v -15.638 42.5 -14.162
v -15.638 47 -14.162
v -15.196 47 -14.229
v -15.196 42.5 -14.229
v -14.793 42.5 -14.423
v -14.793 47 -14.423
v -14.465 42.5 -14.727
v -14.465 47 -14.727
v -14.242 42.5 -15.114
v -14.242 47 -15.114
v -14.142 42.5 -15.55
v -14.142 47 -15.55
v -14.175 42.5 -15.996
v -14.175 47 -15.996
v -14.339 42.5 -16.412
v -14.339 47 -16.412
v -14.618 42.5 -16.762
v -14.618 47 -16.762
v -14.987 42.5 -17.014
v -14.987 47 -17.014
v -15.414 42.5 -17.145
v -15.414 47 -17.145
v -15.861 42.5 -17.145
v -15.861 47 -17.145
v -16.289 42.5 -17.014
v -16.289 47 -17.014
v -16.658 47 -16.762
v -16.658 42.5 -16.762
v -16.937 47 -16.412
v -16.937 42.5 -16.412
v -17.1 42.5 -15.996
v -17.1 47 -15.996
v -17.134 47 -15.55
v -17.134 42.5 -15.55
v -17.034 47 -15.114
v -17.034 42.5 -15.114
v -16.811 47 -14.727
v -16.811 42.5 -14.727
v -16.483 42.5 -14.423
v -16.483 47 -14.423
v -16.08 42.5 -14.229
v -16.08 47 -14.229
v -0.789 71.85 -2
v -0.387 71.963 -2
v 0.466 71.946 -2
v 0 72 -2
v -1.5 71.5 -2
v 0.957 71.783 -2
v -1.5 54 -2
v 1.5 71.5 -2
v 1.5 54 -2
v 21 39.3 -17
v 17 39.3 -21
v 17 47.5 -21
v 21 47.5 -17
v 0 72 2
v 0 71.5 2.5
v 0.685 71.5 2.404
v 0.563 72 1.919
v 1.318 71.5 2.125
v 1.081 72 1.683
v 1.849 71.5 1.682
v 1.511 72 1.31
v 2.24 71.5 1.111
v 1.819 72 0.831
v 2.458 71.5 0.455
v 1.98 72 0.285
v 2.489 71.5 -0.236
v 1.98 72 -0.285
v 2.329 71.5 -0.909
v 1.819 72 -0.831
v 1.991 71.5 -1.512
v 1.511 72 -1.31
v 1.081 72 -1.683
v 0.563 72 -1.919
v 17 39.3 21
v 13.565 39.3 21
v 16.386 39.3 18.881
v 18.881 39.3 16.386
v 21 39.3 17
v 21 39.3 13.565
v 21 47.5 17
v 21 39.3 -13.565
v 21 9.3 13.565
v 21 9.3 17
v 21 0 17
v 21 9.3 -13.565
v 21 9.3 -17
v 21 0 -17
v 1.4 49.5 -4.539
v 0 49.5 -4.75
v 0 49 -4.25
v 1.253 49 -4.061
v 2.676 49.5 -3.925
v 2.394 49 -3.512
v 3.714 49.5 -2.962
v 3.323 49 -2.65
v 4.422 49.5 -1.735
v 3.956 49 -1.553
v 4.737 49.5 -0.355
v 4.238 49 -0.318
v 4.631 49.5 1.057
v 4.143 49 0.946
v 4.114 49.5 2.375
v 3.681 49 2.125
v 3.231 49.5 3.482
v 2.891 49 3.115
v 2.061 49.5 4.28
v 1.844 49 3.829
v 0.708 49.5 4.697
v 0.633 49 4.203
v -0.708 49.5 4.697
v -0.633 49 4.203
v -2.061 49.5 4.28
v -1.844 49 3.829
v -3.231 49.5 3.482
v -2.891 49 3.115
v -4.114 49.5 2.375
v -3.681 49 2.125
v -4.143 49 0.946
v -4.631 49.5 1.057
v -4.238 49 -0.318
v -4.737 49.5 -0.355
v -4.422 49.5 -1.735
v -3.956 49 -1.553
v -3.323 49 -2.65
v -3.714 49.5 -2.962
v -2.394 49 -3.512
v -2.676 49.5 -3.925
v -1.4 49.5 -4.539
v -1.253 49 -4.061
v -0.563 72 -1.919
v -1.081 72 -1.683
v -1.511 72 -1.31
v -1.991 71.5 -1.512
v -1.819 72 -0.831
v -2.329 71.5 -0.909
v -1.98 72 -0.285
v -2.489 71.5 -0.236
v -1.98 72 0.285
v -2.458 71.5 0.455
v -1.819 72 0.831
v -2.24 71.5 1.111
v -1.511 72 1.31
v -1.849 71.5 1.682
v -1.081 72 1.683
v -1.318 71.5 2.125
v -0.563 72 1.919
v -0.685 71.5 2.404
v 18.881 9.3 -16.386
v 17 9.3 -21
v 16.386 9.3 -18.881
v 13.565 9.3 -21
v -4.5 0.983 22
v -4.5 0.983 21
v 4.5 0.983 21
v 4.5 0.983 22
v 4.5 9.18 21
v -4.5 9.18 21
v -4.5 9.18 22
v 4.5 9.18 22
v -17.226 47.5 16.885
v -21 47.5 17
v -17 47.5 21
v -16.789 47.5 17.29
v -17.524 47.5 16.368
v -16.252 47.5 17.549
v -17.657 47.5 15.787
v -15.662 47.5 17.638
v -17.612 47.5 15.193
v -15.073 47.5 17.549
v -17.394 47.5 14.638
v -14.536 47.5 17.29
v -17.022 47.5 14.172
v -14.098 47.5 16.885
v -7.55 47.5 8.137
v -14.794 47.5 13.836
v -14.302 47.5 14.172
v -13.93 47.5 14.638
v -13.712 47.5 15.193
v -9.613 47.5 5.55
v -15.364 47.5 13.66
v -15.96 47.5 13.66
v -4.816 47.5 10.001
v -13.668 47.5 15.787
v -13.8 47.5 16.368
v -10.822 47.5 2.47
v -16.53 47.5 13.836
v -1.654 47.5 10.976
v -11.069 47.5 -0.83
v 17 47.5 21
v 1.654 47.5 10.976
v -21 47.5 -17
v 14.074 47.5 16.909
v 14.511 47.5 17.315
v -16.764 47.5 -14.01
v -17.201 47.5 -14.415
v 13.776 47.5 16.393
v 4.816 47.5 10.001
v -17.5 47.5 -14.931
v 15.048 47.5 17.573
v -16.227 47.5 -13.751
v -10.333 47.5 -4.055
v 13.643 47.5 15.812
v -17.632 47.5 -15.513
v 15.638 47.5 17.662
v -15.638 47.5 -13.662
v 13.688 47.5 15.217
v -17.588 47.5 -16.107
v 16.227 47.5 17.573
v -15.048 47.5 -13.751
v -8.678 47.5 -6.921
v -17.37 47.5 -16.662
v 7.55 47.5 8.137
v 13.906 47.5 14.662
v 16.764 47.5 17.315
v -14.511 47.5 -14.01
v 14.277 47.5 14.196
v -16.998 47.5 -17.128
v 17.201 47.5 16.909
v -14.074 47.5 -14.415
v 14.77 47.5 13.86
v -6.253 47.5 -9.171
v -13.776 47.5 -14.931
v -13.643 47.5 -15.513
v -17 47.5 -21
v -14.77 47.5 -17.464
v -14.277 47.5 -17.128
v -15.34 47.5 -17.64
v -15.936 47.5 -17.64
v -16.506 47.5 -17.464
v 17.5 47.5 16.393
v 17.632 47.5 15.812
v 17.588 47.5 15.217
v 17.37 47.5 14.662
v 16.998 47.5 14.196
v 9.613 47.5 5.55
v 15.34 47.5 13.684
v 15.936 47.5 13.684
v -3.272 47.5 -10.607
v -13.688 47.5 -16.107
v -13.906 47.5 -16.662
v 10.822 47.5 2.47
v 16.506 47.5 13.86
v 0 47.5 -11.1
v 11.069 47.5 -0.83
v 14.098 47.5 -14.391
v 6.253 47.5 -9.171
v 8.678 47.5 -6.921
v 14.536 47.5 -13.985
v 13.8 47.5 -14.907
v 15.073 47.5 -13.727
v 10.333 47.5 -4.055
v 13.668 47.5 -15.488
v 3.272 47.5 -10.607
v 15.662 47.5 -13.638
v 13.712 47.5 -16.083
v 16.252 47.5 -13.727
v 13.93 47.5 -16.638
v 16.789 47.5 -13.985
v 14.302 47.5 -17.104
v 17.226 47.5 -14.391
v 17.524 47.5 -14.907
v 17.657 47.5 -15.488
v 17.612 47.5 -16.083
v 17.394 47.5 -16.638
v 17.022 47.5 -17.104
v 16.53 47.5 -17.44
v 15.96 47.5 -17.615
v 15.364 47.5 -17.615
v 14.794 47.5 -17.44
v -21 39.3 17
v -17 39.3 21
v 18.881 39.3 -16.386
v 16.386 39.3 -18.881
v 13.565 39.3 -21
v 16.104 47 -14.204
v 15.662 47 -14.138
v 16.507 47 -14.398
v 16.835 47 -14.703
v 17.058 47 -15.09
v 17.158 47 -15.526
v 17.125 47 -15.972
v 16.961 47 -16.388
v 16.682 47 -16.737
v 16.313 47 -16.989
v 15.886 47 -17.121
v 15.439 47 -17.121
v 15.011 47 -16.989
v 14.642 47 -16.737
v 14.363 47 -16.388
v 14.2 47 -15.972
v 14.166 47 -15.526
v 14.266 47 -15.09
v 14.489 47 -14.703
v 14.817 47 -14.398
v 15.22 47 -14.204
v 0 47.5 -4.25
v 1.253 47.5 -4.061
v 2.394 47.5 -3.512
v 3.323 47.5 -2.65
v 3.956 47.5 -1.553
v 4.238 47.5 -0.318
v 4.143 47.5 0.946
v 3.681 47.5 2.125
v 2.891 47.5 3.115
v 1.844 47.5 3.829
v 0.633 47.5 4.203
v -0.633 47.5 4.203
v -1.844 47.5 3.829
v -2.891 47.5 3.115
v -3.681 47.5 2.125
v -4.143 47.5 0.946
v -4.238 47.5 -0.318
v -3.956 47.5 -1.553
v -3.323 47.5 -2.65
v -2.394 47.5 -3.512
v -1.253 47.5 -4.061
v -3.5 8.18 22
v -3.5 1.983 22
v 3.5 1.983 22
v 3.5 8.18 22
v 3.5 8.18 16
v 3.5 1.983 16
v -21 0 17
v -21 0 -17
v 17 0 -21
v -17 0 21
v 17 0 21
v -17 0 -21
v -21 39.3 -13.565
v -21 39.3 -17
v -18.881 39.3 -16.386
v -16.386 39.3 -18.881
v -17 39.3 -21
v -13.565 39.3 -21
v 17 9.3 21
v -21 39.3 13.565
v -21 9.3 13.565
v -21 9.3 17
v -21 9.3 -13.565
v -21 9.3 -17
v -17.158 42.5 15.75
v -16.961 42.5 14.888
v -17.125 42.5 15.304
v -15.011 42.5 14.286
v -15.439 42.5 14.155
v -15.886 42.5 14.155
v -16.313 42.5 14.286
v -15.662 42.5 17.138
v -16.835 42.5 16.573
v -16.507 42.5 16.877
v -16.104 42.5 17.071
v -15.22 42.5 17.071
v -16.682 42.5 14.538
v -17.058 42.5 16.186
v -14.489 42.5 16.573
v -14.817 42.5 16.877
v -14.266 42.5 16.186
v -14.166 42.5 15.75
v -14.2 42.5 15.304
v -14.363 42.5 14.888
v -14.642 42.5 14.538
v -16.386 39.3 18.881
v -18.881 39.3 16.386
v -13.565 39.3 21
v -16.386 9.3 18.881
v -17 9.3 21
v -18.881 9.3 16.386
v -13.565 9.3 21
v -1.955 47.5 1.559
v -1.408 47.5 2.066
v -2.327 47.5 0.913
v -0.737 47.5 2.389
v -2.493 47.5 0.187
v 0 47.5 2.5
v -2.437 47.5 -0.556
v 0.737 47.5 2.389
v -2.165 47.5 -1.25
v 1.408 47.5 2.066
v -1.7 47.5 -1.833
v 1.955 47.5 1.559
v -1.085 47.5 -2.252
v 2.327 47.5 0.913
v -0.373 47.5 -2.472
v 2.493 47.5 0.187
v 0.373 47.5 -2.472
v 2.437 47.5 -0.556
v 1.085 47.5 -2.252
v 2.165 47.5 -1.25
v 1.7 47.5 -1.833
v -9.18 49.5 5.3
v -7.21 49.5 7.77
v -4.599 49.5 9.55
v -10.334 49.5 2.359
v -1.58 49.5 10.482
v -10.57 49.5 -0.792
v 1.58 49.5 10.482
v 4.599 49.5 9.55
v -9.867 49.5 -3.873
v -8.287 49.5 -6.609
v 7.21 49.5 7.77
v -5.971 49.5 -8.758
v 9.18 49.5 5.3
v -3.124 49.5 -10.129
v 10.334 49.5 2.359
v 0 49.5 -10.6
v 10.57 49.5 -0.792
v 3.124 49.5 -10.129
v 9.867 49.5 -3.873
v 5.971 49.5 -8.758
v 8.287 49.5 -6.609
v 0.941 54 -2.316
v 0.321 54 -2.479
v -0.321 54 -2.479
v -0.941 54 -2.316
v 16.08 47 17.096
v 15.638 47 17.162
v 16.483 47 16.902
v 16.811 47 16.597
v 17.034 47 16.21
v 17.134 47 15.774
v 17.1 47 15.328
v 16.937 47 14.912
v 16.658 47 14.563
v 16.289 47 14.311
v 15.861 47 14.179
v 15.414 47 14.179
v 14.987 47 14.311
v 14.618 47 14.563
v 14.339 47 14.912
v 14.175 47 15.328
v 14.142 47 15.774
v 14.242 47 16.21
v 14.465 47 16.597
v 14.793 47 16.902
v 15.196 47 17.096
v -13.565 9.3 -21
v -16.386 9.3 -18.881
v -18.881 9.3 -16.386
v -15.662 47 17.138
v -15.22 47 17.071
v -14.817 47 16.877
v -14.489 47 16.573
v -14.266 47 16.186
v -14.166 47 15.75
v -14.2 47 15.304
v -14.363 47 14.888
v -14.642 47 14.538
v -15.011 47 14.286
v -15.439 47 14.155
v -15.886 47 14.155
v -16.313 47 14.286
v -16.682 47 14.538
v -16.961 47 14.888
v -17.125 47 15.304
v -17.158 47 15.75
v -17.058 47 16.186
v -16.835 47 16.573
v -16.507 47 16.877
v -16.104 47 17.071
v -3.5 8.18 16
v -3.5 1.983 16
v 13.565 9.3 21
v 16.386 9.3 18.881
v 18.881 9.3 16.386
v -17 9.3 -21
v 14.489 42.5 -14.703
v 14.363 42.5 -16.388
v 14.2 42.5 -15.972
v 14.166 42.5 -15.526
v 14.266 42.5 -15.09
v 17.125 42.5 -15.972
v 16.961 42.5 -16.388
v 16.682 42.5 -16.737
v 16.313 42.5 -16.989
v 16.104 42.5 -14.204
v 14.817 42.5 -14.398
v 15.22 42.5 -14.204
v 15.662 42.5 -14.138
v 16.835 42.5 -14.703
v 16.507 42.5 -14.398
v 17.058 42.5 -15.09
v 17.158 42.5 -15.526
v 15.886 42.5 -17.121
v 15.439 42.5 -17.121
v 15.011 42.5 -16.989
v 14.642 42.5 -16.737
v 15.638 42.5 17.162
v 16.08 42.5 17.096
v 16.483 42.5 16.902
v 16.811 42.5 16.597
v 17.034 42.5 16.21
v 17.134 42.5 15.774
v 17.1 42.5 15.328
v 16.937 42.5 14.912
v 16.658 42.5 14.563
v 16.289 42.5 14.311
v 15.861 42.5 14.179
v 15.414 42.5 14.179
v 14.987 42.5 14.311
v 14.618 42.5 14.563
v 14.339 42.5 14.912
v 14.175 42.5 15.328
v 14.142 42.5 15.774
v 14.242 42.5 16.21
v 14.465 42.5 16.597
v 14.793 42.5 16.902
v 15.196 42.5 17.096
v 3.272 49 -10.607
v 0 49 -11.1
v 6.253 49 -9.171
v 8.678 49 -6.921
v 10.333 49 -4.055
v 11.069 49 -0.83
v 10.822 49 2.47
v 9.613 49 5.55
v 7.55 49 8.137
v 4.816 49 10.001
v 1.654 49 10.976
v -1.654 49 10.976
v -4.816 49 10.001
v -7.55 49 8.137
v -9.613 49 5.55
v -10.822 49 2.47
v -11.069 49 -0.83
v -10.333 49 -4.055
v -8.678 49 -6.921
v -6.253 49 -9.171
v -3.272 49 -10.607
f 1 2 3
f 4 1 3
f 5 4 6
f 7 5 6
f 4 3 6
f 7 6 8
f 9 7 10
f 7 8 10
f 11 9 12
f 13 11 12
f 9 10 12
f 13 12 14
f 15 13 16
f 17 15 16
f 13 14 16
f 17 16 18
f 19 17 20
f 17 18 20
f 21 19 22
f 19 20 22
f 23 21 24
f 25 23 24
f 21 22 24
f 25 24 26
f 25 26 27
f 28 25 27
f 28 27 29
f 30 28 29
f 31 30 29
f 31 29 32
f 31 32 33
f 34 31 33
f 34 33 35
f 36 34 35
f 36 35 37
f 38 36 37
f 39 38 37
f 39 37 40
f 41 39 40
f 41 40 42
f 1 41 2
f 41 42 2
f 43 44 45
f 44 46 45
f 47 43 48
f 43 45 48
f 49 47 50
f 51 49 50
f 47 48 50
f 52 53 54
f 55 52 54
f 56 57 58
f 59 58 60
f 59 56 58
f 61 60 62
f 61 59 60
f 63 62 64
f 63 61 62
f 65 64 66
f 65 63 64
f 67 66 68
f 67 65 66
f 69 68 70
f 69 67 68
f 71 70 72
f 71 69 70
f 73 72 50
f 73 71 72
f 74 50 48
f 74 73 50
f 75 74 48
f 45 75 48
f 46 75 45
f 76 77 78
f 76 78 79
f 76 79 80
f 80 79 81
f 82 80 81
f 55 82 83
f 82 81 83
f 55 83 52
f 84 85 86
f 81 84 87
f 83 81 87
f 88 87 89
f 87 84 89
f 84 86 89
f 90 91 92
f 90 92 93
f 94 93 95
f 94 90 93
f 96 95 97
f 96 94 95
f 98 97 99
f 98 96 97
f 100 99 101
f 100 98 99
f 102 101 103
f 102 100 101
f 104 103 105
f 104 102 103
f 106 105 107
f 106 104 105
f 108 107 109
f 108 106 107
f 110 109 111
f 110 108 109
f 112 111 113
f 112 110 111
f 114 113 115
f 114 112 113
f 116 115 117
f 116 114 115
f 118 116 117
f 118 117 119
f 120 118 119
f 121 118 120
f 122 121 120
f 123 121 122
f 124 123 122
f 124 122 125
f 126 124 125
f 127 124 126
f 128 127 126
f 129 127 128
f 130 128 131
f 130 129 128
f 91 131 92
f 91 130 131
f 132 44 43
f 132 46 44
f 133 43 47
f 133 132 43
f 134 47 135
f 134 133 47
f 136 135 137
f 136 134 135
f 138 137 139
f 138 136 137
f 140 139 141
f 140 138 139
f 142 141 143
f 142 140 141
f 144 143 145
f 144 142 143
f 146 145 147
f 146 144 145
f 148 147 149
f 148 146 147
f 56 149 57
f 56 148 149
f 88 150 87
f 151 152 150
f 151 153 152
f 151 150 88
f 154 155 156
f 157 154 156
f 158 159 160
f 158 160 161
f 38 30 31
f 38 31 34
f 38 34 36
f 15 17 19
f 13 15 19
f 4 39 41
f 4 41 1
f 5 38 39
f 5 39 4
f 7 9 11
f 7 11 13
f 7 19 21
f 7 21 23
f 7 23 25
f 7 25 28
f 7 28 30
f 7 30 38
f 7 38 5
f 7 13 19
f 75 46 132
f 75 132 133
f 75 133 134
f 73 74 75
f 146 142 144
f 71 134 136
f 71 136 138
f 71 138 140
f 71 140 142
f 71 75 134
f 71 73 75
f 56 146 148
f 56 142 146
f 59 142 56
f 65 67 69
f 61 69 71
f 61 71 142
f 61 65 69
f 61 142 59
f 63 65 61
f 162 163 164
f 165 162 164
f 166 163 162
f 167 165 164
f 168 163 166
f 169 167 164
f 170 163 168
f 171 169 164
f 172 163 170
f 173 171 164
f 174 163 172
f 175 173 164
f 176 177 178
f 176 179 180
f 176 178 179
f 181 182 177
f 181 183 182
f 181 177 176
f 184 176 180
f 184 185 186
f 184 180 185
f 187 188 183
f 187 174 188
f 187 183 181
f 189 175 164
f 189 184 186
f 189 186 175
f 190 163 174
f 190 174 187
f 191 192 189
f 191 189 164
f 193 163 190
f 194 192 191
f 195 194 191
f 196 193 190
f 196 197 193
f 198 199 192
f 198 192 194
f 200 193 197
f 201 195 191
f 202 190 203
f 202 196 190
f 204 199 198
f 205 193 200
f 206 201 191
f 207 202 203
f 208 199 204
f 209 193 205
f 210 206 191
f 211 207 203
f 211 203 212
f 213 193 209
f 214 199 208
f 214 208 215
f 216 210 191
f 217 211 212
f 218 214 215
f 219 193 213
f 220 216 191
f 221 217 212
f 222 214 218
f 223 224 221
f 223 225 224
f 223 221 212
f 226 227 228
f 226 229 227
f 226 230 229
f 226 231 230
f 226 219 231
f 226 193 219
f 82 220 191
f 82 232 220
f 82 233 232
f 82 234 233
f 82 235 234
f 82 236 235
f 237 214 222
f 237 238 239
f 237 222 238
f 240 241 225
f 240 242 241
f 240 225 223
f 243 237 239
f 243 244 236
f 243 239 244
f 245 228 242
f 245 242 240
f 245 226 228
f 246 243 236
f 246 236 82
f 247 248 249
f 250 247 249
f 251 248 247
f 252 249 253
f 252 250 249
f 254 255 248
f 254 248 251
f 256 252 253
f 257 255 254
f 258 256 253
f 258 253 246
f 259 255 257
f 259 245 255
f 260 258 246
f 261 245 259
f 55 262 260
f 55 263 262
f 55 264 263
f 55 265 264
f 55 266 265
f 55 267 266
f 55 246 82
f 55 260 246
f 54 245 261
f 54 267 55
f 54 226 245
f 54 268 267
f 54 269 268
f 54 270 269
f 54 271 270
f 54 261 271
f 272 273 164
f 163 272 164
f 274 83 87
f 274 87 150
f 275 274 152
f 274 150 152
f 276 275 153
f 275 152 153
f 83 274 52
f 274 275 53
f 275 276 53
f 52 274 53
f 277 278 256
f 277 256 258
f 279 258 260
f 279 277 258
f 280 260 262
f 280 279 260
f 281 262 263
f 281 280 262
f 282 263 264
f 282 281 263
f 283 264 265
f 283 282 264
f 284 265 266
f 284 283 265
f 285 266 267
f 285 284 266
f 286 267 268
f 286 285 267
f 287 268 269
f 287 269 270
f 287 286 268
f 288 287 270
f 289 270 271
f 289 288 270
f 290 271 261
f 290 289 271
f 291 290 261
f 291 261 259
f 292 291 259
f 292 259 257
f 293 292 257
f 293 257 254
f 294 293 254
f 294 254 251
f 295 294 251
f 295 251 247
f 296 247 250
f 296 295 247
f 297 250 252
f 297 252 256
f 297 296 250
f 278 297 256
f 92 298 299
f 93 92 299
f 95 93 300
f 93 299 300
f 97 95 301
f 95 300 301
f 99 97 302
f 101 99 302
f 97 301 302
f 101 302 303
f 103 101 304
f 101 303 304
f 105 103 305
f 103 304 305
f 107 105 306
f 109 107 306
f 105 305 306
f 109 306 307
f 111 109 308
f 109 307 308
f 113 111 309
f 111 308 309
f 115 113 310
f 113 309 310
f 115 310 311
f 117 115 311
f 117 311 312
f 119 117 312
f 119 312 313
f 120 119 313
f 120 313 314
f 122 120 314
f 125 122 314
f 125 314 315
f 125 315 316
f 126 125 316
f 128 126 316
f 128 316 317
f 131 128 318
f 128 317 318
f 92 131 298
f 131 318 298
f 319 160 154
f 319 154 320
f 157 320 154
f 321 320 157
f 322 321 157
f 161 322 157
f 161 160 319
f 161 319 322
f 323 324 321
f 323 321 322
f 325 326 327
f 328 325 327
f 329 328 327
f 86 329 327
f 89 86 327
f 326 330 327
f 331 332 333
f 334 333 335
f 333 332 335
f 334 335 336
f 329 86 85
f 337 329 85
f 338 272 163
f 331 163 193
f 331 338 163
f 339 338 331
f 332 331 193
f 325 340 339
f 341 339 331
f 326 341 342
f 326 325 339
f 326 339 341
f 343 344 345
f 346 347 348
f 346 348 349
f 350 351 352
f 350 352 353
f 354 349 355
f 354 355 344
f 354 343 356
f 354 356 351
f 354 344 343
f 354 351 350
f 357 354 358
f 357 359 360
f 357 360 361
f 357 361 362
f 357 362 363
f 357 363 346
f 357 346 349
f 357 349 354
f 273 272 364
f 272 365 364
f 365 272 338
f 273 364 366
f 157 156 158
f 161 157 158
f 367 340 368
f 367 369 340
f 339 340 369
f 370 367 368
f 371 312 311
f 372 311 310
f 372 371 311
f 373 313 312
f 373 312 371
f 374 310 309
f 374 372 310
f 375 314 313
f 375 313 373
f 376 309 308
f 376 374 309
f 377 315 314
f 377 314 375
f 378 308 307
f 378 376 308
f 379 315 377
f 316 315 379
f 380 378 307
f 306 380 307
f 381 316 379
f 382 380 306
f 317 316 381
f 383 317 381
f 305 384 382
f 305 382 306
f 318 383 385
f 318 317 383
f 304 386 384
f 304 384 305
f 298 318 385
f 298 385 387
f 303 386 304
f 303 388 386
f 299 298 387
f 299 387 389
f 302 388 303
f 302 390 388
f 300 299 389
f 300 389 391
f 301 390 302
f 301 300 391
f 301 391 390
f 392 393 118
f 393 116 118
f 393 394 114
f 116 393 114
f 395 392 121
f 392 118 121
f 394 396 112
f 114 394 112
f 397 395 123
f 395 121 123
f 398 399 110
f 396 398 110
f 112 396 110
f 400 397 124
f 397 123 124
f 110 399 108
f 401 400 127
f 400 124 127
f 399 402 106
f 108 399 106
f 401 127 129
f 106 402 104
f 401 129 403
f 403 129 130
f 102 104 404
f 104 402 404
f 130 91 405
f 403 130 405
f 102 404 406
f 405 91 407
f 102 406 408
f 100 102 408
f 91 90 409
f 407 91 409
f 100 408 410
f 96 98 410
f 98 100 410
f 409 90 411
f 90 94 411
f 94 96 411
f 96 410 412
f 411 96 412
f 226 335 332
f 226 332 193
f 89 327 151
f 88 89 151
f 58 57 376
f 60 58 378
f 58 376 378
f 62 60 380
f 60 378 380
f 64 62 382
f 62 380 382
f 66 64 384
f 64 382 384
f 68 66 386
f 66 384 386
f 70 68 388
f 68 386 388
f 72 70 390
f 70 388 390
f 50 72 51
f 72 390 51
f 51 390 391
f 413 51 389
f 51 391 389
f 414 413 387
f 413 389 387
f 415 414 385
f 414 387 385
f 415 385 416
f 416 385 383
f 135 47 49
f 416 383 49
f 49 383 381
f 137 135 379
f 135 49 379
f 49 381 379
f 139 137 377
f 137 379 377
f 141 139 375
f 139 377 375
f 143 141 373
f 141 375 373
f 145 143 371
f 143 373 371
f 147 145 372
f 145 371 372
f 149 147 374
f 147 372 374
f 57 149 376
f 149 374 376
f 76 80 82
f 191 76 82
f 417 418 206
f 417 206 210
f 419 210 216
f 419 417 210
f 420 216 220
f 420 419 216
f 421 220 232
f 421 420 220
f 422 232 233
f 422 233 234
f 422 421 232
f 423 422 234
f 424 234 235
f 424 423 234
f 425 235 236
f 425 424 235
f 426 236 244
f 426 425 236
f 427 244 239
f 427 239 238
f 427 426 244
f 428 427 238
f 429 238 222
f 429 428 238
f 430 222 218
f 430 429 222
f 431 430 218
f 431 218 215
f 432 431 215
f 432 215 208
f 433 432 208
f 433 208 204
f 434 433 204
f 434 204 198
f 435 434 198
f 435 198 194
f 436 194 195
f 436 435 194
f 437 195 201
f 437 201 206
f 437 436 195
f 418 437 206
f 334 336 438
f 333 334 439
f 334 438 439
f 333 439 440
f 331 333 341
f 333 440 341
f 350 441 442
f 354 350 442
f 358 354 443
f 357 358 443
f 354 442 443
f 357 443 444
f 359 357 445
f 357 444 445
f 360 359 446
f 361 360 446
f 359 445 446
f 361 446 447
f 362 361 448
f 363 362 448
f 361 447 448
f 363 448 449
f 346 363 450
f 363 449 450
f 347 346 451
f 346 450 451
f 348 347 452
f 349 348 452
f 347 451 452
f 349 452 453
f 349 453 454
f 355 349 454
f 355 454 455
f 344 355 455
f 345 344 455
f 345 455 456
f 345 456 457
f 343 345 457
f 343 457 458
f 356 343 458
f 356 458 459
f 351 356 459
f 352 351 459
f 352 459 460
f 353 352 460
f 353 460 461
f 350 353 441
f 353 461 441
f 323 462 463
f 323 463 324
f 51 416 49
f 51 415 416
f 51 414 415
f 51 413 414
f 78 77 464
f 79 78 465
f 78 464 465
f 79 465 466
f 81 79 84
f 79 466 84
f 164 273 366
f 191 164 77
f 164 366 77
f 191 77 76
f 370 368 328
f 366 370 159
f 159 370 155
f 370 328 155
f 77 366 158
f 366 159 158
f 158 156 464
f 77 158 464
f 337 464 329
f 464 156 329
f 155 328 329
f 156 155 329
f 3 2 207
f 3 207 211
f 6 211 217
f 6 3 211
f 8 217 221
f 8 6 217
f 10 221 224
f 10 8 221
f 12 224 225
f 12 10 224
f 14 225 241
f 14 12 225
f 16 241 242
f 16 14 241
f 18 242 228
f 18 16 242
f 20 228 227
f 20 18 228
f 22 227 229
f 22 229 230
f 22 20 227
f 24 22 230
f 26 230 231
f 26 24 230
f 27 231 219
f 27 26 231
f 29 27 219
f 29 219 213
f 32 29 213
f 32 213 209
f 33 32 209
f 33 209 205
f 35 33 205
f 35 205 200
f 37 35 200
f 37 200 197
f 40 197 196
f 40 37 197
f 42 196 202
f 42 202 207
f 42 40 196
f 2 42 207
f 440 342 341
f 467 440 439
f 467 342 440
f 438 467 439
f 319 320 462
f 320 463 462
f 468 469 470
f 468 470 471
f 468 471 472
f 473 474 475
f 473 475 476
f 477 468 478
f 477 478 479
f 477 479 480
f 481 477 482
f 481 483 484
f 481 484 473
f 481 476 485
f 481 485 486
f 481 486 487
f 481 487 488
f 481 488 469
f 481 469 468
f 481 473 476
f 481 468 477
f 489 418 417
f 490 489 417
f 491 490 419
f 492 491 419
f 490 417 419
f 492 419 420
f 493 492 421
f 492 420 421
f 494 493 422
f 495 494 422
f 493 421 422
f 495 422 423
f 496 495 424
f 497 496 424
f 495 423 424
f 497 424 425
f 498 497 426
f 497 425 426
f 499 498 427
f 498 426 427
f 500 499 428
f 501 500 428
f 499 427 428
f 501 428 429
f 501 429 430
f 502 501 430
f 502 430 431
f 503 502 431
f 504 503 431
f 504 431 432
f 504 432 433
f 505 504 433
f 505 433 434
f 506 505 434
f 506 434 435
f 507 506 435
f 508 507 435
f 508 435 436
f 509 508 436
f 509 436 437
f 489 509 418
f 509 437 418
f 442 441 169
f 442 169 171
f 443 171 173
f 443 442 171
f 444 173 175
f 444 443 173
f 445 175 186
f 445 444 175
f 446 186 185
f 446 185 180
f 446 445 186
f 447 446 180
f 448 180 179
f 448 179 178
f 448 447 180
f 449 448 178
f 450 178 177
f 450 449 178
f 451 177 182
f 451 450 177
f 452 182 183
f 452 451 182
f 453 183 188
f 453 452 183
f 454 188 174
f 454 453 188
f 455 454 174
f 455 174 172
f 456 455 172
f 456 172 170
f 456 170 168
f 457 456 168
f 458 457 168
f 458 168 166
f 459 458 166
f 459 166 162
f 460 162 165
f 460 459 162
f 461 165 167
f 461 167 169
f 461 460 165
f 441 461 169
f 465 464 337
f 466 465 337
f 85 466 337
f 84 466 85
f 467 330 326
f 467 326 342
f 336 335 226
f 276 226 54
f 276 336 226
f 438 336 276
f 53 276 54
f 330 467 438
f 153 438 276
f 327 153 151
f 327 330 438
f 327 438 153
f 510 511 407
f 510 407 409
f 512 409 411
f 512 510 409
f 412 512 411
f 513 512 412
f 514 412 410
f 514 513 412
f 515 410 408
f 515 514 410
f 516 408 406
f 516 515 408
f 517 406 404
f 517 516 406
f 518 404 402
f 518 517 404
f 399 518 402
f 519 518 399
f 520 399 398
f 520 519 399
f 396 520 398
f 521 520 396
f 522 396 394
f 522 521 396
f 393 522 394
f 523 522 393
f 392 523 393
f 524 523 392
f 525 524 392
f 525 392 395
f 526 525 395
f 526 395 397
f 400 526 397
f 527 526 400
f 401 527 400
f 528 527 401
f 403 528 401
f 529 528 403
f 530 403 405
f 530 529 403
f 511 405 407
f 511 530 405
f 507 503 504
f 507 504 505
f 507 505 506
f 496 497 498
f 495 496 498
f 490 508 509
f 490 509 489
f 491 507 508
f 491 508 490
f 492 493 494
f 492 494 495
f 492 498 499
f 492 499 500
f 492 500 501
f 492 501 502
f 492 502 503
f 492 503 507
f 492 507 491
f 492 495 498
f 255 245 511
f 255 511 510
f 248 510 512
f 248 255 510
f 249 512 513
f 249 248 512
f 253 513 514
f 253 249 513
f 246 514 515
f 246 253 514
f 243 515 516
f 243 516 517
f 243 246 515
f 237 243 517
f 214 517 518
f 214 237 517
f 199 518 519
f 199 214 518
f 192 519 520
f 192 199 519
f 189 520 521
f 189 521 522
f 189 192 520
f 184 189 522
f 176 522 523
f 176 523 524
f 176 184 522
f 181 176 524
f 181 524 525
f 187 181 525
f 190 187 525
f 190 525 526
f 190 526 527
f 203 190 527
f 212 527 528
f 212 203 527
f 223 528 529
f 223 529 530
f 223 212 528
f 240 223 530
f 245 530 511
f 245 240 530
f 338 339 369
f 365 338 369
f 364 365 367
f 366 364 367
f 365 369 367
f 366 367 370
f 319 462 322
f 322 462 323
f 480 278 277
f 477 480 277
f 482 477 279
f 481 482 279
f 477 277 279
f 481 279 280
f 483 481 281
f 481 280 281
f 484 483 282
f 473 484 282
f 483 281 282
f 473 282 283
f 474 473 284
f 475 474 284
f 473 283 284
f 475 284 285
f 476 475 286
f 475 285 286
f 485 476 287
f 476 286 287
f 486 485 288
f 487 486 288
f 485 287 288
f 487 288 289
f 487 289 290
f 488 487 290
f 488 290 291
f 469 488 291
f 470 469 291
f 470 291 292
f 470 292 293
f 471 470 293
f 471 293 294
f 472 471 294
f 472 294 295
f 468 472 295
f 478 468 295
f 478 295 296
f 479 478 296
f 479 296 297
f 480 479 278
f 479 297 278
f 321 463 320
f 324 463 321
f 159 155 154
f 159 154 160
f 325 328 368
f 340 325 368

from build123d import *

# Parameters (mm, degrees)
SKETCH1_W           = 42
SKETCH1_H           = 42
BOSS_EXTRUDE1_DEPTH = 47.5
CHAMFER1_SIZE       = 4
SKETCH2_R           = 11.1
SKETCH2_R_2         = 4.25
BOSS_EXTRUDE2_DEPTH = 2
SKETCH4_R           = 2.5
BOSS_EXTRUDE3_DEPTH = 24.5
CHAMFER2_SIZE       = 0.5
CUT_EXTRUDE1_DEPTH  = 18
SKETCH6_R           = 1.5
CUT_EXTRUDE2_DEPTH  = 5
CUT_EXTRUDE3_START  = 9.3
SKETCH7_R           = 36.852304789
SKETCH7_R_2         = 25
CUT_EXTRUDE3_DEPTH  = 30
SKETCH8_W           = 9
SKETCH8_H           = 8.197254607
SKETCH8_W_2         = 7
SKETCH8_H_2         = 6.197254607
EXTRUDE_THIN1_DEPTH = 1
SKETCH9_W           = 7
SKETCH9_H           = 6.197254607
CUT_EXTRUDE4_DEPTH  = 5
CHAMFER3_SIZE       = 0.5


with BuildPart() as part:
    # Sketch1 → Boss-Extrude1 (new body)
    with BuildSketch(Plane(origin=(0, 0, 0), x_dir=(1, 0, 0), z_dir=(0, 1, 0))):
        Rectangle(SKETCH1_W, SKETCH1_H)
    extrude(amount=BOSS_EXTRUDE1_DEPTH)

    # Chamfer1
    chamfer1_edges = [part.edges().sort_by_distance(p)[0] for p in [
        (21, 23.75, 21),
        (-21, 23.75, 21),
        (-21, 23.75, -21),
        (21, 23.75, -21),
    ]]
    chamfer(chamfer1_edges, length=CHAMFER1_SIZE)

    # Sketch2 → Boss-Extrude2 (add)
    with BuildSketch(Plane.XZ.offset(-47.5)):
        with Locations(Location((0, 0, 0), (0, 0, 270))):
            Circle(SKETCH2_R)
        with Locations(Location((0, 0, 0), (0, 0, 270))):
            Circle(SKETCH2_R_2, mode=Mode.SUBTRACT)
    extrude(amount=-BOSS_EXTRUDE2_DEPTH)

    # Sketch4 → Boss-Extrude3 (add)
    with BuildSketch(Plane(origin=(0, 47.5, 0), x_dir=(1, 0, 0), z_dir=(0, 1, 0))):
        with Locations(Location((0, 0, 0), (0, 0, 270))):
            Circle(SKETCH4_R)
    extrude(amount=BOSS_EXTRUDE3_DEPTH)

    # Chamfer2
    chamfer2_edges = [part.edges().sort_by_distance(p)[0] for p in [
        (0, 72, -2.5),
    ]]
    chamfer(chamfer2_edges, length=CHAMFER2_SIZE)

    # Sketch5 → Cut-Extrude1 (cut)
    with BuildSketch(Plane(origin=(0, 72, 0), x_dir=(1, 0, 0), z_dir=(0, 1, 0))):
        Polygon((-1.867188484, 2), (1.973628394, 2), (0.053219955, 2.996371605), align=None)
    extrude(amount=-CUT_EXTRUDE1_DEPTH, mode=Mode.SUBTRACT)

    # Sketch6 → Cut-Extrude2 (cut)
    with BuildSketch(Plane(origin=(0, 47.5, 0), x_dir=(1, 0, 0), z_dir=(0, 1, 0))):
        with Locations(Location((-15.637811111, 15.662146765, 0), (0, 0, 270))):
            Circle(SKETCH6_R)
        with Locations(Location((15.662146765, 15.637811111, 0), (0, 0, 270))):
            Circle(SKETCH6_R)
        with Locations(Location((15.637811111, -15.662146765, 0), (0, 0, 270))):
            Circle(SKETCH6_R)
        with Locations(Location((-15.662146765, -15.637811111, 0), (0, 0, 270))):
            Circle(SKETCH6_R)
    extrude(amount=-CUT_EXTRUDE2_DEPTH, mode=Mode.SUBTRACT)

    # Sketch7 → Cut-Extrude3 (cut)
    with BuildSketch(Plane(origin=(0, 0, 0), x_dir=(1, 0, 0), z_dir=(0, 1, 0)).offset(CUT_EXTRUDE3_START)):
        Circle(SKETCH7_R)
        Circle(SKETCH7_R_2, mode=Mode.SUBTRACT)
    extrude(amount=CUT_EXTRUDE3_DEPTH, mode=Mode.SUBTRACT)

    # Sketch8 → Extrude-Thin1 (add)
    with BuildSketch(Plane.XY.offset(21)):
        with Locations((0, 5.081594665)):
            Rectangle(SKETCH8_W, SKETCH8_H)
        with Locations((0, 5.081594665)):
            Rectangle(SKETCH8_W_2, SKETCH8_H_2, mode=Mode.SUBTRACT)
    extrude(amount=EXTRUDE_THIN1_DEPTH)

    # Sketch9 → Cut-Extrude4 (cut)
    with BuildSketch(Plane.XY.offset(21)):
        with Locations((0, 5.081594665)):
            Rectangle(SKETCH9_W, SKETCH9_H)
    extrude(amount=-CUT_EXTRUDE4_DEPTH, mode=Mode.SUBTRACT)

    # Chamfer3
    chamfer3_edges = [part.edges().sort_by_distance(p)[0] for p in [
        (0, 49.5, 11.1),
        (0, 49.5, 4.25),
        (-15.637811111, 47.5, -17.162146765),
        (15.662146765, 47.5, -17.137811111),
        (15.637811111, 47.5, 14.162146765),
        (-15.662146765, 47.5, 14.137811111),
    ]]
    chamfer(chamfer3_edges, length=CHAMFER3_SIZE)


solid = part.part
